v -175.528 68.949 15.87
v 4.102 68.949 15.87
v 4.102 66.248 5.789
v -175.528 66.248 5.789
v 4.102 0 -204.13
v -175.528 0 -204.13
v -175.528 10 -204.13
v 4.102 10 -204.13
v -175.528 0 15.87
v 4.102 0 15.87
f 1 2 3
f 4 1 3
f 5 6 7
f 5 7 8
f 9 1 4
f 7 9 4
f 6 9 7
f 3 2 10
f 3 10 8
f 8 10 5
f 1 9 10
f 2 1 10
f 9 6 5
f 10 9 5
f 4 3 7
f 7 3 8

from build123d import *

# Parameters (mm, degrees)
SKETCH_1_W          = 179.63
SKETCH_1_H          = 220
EXTRUDE_1_DEPTH     = 5
SKETCH_2_W          = 179.63
SKETCH_2_H          = 220
EXTRUDE_2_DEPTH     = 103
CUT_EXTRUDE_1_DEPTH = 375


with BuildPart() as part:
    # Эскиз1 → Бобышка-Вытянуть1 (new body)
    with BuildSketch(Plane(origin=(0, 0, 0), x_dir=(1, 0, 0), z_dir=(0, 1, 0))):
        with Locations((-85.713003719, 94.130447377)):
            Rectangle(SKETCH_1_W, SKETCH_1_H)
    extrude(amount=EXTRUDE_1_DEPTH)

    # Эскиз2 → Бобышка-Вытянуть2 (add)
    with BuildSketch(Plane(origin=(0, 5, 0), x_dir=(1, 0, 0), z_dir=(0, 1, 0))):
        with Locations((-85.713003719, 94.130447377)):
            Rectangle(SKETCH_2_W, SKETCH_2_H)
    extrude(amount=EXTRUDE_2_DEPTH)

    # Эскиз3 → Вырез-Вытянуть1 (cut)
    with BuildSketch(Plane(origin=(4.101996281, 0, 0), x_dir=(0, 0, -1), z_dir=(1, 0, 0))):
        Polygon((-5.789329855, 66.247834785), (204.130447377, 10), (204.130447377, 108), (-15.869552623, 108), (-15.869552623, 68.948822335), align=None)
    extrude(amount=-CUT_EXTRUDE_1_DEPTH, mode=Mode.SUBTRACT)


solid = part.part
